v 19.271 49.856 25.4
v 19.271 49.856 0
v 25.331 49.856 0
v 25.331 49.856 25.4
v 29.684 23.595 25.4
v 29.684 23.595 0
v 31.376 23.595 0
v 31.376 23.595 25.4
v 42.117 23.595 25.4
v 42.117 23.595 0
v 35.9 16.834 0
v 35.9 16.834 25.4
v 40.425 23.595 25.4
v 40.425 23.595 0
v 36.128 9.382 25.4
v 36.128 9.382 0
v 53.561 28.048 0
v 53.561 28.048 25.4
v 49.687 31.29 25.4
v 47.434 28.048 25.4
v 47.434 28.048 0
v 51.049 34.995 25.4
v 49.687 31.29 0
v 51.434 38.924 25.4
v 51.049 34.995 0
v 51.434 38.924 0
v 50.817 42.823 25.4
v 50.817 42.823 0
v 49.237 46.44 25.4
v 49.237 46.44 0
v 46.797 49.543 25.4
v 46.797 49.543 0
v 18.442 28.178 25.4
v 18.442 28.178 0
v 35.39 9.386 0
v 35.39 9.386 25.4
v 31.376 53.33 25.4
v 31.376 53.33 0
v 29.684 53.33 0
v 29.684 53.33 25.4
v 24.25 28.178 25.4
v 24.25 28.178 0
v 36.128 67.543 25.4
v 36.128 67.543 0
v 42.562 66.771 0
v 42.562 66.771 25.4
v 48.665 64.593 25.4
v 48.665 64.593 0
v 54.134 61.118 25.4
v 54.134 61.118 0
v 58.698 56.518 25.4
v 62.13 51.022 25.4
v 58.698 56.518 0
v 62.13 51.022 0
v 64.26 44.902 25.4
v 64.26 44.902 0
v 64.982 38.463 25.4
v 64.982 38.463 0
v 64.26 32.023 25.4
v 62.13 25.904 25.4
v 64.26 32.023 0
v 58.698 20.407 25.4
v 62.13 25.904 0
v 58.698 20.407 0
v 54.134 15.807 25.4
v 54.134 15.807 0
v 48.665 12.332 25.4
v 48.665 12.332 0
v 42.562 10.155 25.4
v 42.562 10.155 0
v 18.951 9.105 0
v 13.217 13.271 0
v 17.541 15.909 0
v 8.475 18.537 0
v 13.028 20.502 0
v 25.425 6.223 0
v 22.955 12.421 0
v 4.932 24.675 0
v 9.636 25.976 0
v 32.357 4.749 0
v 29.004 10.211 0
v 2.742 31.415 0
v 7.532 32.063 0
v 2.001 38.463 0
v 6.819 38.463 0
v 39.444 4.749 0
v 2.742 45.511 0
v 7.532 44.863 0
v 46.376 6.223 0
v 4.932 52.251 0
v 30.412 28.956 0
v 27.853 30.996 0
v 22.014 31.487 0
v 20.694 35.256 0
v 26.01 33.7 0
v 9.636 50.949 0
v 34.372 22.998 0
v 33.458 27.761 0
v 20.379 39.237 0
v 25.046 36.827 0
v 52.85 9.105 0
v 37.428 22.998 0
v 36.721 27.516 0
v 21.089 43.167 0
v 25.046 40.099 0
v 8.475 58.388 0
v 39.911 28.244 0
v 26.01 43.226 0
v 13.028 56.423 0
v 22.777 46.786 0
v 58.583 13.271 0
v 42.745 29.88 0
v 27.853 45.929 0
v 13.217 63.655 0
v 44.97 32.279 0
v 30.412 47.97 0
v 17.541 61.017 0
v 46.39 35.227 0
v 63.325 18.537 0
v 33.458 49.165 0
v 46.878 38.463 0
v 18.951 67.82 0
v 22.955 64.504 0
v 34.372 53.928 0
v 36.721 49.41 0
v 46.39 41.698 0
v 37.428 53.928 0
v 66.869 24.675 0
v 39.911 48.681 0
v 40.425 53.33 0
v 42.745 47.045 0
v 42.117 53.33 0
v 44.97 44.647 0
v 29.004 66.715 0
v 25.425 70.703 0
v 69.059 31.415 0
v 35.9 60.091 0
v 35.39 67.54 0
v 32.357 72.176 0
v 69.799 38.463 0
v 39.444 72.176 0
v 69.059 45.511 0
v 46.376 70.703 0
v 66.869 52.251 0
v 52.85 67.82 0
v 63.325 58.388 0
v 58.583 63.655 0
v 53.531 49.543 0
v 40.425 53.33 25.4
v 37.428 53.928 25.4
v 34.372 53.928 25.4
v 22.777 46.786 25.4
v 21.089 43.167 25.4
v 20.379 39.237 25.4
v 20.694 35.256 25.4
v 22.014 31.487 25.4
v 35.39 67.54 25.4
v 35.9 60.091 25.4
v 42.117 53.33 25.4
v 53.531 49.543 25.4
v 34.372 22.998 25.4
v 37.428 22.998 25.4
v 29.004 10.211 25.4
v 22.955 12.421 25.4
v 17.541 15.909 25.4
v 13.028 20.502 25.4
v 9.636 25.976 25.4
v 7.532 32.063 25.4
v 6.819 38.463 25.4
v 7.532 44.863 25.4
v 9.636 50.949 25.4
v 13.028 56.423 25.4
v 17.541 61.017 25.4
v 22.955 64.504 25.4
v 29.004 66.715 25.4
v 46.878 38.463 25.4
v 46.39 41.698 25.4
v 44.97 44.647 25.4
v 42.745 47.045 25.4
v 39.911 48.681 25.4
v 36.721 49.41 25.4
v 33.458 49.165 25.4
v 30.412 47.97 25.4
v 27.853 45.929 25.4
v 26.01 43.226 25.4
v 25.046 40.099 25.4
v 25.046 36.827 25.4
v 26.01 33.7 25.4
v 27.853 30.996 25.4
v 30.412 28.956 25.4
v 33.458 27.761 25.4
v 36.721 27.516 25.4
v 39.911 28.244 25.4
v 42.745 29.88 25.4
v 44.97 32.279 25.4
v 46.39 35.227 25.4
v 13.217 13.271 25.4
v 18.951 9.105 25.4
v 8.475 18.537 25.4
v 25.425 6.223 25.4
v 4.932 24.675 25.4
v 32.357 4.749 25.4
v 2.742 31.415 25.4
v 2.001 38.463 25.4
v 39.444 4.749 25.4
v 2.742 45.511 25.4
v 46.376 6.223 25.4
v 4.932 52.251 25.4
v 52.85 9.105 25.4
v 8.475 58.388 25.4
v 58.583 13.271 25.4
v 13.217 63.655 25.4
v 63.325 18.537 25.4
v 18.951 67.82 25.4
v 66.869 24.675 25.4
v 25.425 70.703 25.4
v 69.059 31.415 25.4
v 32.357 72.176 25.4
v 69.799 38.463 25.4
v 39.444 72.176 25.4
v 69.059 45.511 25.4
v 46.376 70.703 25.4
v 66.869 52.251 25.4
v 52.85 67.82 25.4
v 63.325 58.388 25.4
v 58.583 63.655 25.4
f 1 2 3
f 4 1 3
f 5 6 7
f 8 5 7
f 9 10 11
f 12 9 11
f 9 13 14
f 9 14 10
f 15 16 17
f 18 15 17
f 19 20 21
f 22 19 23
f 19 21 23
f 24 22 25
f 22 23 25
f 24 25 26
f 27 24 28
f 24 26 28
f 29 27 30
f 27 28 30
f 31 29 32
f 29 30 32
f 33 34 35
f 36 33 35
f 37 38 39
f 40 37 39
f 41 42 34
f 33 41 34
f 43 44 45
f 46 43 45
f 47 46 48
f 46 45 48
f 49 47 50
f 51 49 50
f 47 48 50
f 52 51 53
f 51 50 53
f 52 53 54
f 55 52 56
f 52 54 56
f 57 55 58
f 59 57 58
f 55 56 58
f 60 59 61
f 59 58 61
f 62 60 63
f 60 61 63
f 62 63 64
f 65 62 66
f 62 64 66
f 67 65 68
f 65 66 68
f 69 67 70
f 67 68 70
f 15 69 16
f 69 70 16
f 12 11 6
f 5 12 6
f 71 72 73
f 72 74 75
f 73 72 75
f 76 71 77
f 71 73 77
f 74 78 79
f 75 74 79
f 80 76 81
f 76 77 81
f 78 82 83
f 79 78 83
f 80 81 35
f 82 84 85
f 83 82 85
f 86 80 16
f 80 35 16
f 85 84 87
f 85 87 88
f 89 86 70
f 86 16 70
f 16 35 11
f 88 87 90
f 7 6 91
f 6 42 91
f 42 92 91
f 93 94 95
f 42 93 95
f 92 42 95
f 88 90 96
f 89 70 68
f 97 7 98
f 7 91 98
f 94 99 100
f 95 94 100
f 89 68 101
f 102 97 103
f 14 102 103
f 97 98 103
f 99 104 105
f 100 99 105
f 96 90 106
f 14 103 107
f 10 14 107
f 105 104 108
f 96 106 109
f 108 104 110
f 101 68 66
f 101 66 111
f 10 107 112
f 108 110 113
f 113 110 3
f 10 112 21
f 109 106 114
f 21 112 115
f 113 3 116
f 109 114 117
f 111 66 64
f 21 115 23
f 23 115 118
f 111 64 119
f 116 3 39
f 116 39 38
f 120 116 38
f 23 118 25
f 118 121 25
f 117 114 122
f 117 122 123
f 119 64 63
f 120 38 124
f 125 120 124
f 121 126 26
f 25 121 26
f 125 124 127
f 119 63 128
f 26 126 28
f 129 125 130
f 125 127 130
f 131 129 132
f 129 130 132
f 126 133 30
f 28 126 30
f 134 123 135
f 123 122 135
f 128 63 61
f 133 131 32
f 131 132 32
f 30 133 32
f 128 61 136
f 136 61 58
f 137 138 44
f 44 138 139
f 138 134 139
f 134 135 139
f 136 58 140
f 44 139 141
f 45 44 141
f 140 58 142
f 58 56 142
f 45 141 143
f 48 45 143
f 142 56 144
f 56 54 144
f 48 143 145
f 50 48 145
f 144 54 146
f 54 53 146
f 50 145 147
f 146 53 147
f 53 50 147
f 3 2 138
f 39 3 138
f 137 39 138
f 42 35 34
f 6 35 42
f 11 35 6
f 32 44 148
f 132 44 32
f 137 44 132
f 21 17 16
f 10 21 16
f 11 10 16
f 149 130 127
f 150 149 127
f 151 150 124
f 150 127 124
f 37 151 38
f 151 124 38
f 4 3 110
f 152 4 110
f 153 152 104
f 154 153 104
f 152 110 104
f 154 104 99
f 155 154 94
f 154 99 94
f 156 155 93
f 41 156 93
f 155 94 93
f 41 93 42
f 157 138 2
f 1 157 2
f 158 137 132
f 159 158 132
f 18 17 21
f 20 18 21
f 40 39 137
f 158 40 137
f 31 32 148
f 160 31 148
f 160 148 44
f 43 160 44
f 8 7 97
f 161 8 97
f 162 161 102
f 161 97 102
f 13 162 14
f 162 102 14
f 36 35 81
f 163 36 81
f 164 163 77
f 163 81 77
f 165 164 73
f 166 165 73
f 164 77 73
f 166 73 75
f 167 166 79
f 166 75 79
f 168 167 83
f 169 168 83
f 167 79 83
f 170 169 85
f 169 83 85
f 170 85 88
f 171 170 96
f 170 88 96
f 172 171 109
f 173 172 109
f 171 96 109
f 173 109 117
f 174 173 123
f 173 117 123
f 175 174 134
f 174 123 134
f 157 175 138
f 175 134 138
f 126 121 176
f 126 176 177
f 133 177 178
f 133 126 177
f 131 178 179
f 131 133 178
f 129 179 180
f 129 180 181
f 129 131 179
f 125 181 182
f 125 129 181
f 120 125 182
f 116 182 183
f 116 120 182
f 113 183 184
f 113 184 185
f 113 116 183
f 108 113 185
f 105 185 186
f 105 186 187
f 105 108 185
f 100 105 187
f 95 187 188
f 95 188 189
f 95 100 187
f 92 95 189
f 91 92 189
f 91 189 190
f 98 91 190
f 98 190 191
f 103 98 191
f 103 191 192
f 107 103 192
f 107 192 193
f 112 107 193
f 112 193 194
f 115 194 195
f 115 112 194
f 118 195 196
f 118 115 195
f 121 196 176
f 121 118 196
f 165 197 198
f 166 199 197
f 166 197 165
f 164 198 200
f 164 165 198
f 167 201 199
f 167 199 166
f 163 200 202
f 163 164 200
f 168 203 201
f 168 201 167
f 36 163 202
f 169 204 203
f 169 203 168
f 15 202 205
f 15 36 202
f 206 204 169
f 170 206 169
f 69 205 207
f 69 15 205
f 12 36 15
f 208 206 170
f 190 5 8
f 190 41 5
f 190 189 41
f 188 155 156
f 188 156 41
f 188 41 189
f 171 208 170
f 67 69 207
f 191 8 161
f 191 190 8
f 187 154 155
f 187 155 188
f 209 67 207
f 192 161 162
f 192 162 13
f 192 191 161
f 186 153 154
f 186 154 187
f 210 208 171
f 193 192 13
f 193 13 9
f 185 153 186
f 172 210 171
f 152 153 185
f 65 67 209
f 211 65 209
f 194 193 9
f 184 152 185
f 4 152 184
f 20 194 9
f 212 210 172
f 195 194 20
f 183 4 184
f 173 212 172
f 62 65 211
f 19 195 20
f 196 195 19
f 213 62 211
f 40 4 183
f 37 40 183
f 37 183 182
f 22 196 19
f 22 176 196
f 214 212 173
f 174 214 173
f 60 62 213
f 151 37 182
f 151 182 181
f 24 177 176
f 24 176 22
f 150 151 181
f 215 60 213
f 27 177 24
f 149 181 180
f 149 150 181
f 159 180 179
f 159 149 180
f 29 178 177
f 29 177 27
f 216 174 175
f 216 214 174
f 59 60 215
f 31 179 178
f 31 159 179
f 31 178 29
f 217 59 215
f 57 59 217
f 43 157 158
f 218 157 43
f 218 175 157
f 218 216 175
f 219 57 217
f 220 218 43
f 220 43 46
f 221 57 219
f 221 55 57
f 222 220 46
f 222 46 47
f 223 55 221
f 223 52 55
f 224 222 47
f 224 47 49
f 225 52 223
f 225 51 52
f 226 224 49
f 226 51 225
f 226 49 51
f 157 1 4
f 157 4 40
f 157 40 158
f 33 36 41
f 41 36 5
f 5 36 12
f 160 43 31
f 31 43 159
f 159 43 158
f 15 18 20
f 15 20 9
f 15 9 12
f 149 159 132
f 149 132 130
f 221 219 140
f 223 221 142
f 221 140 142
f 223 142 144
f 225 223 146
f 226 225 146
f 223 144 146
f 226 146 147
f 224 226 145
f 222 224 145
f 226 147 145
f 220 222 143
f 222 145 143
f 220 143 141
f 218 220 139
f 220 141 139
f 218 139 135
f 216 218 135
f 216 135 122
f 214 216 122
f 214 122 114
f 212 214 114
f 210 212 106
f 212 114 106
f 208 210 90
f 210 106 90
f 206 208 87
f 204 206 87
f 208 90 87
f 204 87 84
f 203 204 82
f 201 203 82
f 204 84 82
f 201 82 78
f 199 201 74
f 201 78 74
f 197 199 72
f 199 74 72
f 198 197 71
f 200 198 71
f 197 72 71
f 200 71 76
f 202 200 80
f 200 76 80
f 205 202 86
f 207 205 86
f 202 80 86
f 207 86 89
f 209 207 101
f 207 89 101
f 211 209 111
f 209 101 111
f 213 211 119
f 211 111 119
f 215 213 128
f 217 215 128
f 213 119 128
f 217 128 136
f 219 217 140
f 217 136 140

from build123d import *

# Parameters (mm, degrees)
F0_R     = 33.899089
F0_R_2   = 10.977383
F1_DEPTH = 25.4


with BuildPart() as f1:
    # F0 (on Top) → F1 (new body)
    with BuildSketch(Plane.XY):
        with Locations((35.900313, 38.462833)):
            Circle(F0_R)
        with BuildLine():
            Line((29.684071, 23.595444), (31.375829, 23.595444))
            ThreePointArc((31.375829, 23.595444), (35.900313, 22.922234), (40.424798, 23.595444))
            Line((40.424798, 23.595444), (42.116555, 23.595444))
            Line((42.116555, 23.595444), (35.900313, 16.834289))
            Line((35.900313, 16.834289), (29.684071, 23.595444))
        make_face(mode=Mode.SUBTRACT)
        with BuildLine():
            Line((35.390319, 67.539793), (19.270614, 49.856011))
            Line((19.270614, 49.856011), (25.331222, 49.856011))
            ThreePointArc((25.331222, 49.856011), (20.379015, 39.237091), (24.249848, 28.178046))
            Line((24.249848, 28.178046), (18.442286, 28.178046))
            Line((18.442286, 28.178046), (35.390319, 9.385872))
            ThreePointArc((35.390319, 9.385872), (6.81888, 38.462833), (35.390319, 67.539793))
        make_face(mode=Mode.SUBTRACT)
        with Locations((35.900313, 38.462833)):
            Circle(F0_R_2, mode=Mode.SUBTRACT)
        with BuildLine():
            ThreePointArc((36.128241, 67.543372), (64.981746, 38.462833), (36.128241, 9.382293))
            Line((36.128241, 9.382293), (53.560682, 28.047737))
            Line((53.560682, 28.047737), (47.434436, 28.047737))
            ThreePointArc((47.434436, 28.047737), (51.434076, 38.923711), (46.796669, 49.543429))
            Line((46.796669, 49.543429), (53.530753, 49.543429))
            Line((53.530753, 49.543429), (36.128241, 67.543372))
        make_face(mode=Mode.SUBTRACT)
        with BuildLine():
            ThreePointArc((40.424798, 53.330221), (35.900313, 54.003431), (31.375829, 53.330221))
            Line((31.375829, 53.330221), (29.684071, 53.330221))
            Line((29.684071, 53.330221), (35.900313, 60.091376))
            Line((35.900313, 60.091376), (42.116555, 53.330221))
            Line((42.116555, 53.330221), (40.424798, 53.330221))
        make_face(mode=Mode.SUBTRACT)
    extrude(amount=F1_DEPTH)


solid = f1.part
